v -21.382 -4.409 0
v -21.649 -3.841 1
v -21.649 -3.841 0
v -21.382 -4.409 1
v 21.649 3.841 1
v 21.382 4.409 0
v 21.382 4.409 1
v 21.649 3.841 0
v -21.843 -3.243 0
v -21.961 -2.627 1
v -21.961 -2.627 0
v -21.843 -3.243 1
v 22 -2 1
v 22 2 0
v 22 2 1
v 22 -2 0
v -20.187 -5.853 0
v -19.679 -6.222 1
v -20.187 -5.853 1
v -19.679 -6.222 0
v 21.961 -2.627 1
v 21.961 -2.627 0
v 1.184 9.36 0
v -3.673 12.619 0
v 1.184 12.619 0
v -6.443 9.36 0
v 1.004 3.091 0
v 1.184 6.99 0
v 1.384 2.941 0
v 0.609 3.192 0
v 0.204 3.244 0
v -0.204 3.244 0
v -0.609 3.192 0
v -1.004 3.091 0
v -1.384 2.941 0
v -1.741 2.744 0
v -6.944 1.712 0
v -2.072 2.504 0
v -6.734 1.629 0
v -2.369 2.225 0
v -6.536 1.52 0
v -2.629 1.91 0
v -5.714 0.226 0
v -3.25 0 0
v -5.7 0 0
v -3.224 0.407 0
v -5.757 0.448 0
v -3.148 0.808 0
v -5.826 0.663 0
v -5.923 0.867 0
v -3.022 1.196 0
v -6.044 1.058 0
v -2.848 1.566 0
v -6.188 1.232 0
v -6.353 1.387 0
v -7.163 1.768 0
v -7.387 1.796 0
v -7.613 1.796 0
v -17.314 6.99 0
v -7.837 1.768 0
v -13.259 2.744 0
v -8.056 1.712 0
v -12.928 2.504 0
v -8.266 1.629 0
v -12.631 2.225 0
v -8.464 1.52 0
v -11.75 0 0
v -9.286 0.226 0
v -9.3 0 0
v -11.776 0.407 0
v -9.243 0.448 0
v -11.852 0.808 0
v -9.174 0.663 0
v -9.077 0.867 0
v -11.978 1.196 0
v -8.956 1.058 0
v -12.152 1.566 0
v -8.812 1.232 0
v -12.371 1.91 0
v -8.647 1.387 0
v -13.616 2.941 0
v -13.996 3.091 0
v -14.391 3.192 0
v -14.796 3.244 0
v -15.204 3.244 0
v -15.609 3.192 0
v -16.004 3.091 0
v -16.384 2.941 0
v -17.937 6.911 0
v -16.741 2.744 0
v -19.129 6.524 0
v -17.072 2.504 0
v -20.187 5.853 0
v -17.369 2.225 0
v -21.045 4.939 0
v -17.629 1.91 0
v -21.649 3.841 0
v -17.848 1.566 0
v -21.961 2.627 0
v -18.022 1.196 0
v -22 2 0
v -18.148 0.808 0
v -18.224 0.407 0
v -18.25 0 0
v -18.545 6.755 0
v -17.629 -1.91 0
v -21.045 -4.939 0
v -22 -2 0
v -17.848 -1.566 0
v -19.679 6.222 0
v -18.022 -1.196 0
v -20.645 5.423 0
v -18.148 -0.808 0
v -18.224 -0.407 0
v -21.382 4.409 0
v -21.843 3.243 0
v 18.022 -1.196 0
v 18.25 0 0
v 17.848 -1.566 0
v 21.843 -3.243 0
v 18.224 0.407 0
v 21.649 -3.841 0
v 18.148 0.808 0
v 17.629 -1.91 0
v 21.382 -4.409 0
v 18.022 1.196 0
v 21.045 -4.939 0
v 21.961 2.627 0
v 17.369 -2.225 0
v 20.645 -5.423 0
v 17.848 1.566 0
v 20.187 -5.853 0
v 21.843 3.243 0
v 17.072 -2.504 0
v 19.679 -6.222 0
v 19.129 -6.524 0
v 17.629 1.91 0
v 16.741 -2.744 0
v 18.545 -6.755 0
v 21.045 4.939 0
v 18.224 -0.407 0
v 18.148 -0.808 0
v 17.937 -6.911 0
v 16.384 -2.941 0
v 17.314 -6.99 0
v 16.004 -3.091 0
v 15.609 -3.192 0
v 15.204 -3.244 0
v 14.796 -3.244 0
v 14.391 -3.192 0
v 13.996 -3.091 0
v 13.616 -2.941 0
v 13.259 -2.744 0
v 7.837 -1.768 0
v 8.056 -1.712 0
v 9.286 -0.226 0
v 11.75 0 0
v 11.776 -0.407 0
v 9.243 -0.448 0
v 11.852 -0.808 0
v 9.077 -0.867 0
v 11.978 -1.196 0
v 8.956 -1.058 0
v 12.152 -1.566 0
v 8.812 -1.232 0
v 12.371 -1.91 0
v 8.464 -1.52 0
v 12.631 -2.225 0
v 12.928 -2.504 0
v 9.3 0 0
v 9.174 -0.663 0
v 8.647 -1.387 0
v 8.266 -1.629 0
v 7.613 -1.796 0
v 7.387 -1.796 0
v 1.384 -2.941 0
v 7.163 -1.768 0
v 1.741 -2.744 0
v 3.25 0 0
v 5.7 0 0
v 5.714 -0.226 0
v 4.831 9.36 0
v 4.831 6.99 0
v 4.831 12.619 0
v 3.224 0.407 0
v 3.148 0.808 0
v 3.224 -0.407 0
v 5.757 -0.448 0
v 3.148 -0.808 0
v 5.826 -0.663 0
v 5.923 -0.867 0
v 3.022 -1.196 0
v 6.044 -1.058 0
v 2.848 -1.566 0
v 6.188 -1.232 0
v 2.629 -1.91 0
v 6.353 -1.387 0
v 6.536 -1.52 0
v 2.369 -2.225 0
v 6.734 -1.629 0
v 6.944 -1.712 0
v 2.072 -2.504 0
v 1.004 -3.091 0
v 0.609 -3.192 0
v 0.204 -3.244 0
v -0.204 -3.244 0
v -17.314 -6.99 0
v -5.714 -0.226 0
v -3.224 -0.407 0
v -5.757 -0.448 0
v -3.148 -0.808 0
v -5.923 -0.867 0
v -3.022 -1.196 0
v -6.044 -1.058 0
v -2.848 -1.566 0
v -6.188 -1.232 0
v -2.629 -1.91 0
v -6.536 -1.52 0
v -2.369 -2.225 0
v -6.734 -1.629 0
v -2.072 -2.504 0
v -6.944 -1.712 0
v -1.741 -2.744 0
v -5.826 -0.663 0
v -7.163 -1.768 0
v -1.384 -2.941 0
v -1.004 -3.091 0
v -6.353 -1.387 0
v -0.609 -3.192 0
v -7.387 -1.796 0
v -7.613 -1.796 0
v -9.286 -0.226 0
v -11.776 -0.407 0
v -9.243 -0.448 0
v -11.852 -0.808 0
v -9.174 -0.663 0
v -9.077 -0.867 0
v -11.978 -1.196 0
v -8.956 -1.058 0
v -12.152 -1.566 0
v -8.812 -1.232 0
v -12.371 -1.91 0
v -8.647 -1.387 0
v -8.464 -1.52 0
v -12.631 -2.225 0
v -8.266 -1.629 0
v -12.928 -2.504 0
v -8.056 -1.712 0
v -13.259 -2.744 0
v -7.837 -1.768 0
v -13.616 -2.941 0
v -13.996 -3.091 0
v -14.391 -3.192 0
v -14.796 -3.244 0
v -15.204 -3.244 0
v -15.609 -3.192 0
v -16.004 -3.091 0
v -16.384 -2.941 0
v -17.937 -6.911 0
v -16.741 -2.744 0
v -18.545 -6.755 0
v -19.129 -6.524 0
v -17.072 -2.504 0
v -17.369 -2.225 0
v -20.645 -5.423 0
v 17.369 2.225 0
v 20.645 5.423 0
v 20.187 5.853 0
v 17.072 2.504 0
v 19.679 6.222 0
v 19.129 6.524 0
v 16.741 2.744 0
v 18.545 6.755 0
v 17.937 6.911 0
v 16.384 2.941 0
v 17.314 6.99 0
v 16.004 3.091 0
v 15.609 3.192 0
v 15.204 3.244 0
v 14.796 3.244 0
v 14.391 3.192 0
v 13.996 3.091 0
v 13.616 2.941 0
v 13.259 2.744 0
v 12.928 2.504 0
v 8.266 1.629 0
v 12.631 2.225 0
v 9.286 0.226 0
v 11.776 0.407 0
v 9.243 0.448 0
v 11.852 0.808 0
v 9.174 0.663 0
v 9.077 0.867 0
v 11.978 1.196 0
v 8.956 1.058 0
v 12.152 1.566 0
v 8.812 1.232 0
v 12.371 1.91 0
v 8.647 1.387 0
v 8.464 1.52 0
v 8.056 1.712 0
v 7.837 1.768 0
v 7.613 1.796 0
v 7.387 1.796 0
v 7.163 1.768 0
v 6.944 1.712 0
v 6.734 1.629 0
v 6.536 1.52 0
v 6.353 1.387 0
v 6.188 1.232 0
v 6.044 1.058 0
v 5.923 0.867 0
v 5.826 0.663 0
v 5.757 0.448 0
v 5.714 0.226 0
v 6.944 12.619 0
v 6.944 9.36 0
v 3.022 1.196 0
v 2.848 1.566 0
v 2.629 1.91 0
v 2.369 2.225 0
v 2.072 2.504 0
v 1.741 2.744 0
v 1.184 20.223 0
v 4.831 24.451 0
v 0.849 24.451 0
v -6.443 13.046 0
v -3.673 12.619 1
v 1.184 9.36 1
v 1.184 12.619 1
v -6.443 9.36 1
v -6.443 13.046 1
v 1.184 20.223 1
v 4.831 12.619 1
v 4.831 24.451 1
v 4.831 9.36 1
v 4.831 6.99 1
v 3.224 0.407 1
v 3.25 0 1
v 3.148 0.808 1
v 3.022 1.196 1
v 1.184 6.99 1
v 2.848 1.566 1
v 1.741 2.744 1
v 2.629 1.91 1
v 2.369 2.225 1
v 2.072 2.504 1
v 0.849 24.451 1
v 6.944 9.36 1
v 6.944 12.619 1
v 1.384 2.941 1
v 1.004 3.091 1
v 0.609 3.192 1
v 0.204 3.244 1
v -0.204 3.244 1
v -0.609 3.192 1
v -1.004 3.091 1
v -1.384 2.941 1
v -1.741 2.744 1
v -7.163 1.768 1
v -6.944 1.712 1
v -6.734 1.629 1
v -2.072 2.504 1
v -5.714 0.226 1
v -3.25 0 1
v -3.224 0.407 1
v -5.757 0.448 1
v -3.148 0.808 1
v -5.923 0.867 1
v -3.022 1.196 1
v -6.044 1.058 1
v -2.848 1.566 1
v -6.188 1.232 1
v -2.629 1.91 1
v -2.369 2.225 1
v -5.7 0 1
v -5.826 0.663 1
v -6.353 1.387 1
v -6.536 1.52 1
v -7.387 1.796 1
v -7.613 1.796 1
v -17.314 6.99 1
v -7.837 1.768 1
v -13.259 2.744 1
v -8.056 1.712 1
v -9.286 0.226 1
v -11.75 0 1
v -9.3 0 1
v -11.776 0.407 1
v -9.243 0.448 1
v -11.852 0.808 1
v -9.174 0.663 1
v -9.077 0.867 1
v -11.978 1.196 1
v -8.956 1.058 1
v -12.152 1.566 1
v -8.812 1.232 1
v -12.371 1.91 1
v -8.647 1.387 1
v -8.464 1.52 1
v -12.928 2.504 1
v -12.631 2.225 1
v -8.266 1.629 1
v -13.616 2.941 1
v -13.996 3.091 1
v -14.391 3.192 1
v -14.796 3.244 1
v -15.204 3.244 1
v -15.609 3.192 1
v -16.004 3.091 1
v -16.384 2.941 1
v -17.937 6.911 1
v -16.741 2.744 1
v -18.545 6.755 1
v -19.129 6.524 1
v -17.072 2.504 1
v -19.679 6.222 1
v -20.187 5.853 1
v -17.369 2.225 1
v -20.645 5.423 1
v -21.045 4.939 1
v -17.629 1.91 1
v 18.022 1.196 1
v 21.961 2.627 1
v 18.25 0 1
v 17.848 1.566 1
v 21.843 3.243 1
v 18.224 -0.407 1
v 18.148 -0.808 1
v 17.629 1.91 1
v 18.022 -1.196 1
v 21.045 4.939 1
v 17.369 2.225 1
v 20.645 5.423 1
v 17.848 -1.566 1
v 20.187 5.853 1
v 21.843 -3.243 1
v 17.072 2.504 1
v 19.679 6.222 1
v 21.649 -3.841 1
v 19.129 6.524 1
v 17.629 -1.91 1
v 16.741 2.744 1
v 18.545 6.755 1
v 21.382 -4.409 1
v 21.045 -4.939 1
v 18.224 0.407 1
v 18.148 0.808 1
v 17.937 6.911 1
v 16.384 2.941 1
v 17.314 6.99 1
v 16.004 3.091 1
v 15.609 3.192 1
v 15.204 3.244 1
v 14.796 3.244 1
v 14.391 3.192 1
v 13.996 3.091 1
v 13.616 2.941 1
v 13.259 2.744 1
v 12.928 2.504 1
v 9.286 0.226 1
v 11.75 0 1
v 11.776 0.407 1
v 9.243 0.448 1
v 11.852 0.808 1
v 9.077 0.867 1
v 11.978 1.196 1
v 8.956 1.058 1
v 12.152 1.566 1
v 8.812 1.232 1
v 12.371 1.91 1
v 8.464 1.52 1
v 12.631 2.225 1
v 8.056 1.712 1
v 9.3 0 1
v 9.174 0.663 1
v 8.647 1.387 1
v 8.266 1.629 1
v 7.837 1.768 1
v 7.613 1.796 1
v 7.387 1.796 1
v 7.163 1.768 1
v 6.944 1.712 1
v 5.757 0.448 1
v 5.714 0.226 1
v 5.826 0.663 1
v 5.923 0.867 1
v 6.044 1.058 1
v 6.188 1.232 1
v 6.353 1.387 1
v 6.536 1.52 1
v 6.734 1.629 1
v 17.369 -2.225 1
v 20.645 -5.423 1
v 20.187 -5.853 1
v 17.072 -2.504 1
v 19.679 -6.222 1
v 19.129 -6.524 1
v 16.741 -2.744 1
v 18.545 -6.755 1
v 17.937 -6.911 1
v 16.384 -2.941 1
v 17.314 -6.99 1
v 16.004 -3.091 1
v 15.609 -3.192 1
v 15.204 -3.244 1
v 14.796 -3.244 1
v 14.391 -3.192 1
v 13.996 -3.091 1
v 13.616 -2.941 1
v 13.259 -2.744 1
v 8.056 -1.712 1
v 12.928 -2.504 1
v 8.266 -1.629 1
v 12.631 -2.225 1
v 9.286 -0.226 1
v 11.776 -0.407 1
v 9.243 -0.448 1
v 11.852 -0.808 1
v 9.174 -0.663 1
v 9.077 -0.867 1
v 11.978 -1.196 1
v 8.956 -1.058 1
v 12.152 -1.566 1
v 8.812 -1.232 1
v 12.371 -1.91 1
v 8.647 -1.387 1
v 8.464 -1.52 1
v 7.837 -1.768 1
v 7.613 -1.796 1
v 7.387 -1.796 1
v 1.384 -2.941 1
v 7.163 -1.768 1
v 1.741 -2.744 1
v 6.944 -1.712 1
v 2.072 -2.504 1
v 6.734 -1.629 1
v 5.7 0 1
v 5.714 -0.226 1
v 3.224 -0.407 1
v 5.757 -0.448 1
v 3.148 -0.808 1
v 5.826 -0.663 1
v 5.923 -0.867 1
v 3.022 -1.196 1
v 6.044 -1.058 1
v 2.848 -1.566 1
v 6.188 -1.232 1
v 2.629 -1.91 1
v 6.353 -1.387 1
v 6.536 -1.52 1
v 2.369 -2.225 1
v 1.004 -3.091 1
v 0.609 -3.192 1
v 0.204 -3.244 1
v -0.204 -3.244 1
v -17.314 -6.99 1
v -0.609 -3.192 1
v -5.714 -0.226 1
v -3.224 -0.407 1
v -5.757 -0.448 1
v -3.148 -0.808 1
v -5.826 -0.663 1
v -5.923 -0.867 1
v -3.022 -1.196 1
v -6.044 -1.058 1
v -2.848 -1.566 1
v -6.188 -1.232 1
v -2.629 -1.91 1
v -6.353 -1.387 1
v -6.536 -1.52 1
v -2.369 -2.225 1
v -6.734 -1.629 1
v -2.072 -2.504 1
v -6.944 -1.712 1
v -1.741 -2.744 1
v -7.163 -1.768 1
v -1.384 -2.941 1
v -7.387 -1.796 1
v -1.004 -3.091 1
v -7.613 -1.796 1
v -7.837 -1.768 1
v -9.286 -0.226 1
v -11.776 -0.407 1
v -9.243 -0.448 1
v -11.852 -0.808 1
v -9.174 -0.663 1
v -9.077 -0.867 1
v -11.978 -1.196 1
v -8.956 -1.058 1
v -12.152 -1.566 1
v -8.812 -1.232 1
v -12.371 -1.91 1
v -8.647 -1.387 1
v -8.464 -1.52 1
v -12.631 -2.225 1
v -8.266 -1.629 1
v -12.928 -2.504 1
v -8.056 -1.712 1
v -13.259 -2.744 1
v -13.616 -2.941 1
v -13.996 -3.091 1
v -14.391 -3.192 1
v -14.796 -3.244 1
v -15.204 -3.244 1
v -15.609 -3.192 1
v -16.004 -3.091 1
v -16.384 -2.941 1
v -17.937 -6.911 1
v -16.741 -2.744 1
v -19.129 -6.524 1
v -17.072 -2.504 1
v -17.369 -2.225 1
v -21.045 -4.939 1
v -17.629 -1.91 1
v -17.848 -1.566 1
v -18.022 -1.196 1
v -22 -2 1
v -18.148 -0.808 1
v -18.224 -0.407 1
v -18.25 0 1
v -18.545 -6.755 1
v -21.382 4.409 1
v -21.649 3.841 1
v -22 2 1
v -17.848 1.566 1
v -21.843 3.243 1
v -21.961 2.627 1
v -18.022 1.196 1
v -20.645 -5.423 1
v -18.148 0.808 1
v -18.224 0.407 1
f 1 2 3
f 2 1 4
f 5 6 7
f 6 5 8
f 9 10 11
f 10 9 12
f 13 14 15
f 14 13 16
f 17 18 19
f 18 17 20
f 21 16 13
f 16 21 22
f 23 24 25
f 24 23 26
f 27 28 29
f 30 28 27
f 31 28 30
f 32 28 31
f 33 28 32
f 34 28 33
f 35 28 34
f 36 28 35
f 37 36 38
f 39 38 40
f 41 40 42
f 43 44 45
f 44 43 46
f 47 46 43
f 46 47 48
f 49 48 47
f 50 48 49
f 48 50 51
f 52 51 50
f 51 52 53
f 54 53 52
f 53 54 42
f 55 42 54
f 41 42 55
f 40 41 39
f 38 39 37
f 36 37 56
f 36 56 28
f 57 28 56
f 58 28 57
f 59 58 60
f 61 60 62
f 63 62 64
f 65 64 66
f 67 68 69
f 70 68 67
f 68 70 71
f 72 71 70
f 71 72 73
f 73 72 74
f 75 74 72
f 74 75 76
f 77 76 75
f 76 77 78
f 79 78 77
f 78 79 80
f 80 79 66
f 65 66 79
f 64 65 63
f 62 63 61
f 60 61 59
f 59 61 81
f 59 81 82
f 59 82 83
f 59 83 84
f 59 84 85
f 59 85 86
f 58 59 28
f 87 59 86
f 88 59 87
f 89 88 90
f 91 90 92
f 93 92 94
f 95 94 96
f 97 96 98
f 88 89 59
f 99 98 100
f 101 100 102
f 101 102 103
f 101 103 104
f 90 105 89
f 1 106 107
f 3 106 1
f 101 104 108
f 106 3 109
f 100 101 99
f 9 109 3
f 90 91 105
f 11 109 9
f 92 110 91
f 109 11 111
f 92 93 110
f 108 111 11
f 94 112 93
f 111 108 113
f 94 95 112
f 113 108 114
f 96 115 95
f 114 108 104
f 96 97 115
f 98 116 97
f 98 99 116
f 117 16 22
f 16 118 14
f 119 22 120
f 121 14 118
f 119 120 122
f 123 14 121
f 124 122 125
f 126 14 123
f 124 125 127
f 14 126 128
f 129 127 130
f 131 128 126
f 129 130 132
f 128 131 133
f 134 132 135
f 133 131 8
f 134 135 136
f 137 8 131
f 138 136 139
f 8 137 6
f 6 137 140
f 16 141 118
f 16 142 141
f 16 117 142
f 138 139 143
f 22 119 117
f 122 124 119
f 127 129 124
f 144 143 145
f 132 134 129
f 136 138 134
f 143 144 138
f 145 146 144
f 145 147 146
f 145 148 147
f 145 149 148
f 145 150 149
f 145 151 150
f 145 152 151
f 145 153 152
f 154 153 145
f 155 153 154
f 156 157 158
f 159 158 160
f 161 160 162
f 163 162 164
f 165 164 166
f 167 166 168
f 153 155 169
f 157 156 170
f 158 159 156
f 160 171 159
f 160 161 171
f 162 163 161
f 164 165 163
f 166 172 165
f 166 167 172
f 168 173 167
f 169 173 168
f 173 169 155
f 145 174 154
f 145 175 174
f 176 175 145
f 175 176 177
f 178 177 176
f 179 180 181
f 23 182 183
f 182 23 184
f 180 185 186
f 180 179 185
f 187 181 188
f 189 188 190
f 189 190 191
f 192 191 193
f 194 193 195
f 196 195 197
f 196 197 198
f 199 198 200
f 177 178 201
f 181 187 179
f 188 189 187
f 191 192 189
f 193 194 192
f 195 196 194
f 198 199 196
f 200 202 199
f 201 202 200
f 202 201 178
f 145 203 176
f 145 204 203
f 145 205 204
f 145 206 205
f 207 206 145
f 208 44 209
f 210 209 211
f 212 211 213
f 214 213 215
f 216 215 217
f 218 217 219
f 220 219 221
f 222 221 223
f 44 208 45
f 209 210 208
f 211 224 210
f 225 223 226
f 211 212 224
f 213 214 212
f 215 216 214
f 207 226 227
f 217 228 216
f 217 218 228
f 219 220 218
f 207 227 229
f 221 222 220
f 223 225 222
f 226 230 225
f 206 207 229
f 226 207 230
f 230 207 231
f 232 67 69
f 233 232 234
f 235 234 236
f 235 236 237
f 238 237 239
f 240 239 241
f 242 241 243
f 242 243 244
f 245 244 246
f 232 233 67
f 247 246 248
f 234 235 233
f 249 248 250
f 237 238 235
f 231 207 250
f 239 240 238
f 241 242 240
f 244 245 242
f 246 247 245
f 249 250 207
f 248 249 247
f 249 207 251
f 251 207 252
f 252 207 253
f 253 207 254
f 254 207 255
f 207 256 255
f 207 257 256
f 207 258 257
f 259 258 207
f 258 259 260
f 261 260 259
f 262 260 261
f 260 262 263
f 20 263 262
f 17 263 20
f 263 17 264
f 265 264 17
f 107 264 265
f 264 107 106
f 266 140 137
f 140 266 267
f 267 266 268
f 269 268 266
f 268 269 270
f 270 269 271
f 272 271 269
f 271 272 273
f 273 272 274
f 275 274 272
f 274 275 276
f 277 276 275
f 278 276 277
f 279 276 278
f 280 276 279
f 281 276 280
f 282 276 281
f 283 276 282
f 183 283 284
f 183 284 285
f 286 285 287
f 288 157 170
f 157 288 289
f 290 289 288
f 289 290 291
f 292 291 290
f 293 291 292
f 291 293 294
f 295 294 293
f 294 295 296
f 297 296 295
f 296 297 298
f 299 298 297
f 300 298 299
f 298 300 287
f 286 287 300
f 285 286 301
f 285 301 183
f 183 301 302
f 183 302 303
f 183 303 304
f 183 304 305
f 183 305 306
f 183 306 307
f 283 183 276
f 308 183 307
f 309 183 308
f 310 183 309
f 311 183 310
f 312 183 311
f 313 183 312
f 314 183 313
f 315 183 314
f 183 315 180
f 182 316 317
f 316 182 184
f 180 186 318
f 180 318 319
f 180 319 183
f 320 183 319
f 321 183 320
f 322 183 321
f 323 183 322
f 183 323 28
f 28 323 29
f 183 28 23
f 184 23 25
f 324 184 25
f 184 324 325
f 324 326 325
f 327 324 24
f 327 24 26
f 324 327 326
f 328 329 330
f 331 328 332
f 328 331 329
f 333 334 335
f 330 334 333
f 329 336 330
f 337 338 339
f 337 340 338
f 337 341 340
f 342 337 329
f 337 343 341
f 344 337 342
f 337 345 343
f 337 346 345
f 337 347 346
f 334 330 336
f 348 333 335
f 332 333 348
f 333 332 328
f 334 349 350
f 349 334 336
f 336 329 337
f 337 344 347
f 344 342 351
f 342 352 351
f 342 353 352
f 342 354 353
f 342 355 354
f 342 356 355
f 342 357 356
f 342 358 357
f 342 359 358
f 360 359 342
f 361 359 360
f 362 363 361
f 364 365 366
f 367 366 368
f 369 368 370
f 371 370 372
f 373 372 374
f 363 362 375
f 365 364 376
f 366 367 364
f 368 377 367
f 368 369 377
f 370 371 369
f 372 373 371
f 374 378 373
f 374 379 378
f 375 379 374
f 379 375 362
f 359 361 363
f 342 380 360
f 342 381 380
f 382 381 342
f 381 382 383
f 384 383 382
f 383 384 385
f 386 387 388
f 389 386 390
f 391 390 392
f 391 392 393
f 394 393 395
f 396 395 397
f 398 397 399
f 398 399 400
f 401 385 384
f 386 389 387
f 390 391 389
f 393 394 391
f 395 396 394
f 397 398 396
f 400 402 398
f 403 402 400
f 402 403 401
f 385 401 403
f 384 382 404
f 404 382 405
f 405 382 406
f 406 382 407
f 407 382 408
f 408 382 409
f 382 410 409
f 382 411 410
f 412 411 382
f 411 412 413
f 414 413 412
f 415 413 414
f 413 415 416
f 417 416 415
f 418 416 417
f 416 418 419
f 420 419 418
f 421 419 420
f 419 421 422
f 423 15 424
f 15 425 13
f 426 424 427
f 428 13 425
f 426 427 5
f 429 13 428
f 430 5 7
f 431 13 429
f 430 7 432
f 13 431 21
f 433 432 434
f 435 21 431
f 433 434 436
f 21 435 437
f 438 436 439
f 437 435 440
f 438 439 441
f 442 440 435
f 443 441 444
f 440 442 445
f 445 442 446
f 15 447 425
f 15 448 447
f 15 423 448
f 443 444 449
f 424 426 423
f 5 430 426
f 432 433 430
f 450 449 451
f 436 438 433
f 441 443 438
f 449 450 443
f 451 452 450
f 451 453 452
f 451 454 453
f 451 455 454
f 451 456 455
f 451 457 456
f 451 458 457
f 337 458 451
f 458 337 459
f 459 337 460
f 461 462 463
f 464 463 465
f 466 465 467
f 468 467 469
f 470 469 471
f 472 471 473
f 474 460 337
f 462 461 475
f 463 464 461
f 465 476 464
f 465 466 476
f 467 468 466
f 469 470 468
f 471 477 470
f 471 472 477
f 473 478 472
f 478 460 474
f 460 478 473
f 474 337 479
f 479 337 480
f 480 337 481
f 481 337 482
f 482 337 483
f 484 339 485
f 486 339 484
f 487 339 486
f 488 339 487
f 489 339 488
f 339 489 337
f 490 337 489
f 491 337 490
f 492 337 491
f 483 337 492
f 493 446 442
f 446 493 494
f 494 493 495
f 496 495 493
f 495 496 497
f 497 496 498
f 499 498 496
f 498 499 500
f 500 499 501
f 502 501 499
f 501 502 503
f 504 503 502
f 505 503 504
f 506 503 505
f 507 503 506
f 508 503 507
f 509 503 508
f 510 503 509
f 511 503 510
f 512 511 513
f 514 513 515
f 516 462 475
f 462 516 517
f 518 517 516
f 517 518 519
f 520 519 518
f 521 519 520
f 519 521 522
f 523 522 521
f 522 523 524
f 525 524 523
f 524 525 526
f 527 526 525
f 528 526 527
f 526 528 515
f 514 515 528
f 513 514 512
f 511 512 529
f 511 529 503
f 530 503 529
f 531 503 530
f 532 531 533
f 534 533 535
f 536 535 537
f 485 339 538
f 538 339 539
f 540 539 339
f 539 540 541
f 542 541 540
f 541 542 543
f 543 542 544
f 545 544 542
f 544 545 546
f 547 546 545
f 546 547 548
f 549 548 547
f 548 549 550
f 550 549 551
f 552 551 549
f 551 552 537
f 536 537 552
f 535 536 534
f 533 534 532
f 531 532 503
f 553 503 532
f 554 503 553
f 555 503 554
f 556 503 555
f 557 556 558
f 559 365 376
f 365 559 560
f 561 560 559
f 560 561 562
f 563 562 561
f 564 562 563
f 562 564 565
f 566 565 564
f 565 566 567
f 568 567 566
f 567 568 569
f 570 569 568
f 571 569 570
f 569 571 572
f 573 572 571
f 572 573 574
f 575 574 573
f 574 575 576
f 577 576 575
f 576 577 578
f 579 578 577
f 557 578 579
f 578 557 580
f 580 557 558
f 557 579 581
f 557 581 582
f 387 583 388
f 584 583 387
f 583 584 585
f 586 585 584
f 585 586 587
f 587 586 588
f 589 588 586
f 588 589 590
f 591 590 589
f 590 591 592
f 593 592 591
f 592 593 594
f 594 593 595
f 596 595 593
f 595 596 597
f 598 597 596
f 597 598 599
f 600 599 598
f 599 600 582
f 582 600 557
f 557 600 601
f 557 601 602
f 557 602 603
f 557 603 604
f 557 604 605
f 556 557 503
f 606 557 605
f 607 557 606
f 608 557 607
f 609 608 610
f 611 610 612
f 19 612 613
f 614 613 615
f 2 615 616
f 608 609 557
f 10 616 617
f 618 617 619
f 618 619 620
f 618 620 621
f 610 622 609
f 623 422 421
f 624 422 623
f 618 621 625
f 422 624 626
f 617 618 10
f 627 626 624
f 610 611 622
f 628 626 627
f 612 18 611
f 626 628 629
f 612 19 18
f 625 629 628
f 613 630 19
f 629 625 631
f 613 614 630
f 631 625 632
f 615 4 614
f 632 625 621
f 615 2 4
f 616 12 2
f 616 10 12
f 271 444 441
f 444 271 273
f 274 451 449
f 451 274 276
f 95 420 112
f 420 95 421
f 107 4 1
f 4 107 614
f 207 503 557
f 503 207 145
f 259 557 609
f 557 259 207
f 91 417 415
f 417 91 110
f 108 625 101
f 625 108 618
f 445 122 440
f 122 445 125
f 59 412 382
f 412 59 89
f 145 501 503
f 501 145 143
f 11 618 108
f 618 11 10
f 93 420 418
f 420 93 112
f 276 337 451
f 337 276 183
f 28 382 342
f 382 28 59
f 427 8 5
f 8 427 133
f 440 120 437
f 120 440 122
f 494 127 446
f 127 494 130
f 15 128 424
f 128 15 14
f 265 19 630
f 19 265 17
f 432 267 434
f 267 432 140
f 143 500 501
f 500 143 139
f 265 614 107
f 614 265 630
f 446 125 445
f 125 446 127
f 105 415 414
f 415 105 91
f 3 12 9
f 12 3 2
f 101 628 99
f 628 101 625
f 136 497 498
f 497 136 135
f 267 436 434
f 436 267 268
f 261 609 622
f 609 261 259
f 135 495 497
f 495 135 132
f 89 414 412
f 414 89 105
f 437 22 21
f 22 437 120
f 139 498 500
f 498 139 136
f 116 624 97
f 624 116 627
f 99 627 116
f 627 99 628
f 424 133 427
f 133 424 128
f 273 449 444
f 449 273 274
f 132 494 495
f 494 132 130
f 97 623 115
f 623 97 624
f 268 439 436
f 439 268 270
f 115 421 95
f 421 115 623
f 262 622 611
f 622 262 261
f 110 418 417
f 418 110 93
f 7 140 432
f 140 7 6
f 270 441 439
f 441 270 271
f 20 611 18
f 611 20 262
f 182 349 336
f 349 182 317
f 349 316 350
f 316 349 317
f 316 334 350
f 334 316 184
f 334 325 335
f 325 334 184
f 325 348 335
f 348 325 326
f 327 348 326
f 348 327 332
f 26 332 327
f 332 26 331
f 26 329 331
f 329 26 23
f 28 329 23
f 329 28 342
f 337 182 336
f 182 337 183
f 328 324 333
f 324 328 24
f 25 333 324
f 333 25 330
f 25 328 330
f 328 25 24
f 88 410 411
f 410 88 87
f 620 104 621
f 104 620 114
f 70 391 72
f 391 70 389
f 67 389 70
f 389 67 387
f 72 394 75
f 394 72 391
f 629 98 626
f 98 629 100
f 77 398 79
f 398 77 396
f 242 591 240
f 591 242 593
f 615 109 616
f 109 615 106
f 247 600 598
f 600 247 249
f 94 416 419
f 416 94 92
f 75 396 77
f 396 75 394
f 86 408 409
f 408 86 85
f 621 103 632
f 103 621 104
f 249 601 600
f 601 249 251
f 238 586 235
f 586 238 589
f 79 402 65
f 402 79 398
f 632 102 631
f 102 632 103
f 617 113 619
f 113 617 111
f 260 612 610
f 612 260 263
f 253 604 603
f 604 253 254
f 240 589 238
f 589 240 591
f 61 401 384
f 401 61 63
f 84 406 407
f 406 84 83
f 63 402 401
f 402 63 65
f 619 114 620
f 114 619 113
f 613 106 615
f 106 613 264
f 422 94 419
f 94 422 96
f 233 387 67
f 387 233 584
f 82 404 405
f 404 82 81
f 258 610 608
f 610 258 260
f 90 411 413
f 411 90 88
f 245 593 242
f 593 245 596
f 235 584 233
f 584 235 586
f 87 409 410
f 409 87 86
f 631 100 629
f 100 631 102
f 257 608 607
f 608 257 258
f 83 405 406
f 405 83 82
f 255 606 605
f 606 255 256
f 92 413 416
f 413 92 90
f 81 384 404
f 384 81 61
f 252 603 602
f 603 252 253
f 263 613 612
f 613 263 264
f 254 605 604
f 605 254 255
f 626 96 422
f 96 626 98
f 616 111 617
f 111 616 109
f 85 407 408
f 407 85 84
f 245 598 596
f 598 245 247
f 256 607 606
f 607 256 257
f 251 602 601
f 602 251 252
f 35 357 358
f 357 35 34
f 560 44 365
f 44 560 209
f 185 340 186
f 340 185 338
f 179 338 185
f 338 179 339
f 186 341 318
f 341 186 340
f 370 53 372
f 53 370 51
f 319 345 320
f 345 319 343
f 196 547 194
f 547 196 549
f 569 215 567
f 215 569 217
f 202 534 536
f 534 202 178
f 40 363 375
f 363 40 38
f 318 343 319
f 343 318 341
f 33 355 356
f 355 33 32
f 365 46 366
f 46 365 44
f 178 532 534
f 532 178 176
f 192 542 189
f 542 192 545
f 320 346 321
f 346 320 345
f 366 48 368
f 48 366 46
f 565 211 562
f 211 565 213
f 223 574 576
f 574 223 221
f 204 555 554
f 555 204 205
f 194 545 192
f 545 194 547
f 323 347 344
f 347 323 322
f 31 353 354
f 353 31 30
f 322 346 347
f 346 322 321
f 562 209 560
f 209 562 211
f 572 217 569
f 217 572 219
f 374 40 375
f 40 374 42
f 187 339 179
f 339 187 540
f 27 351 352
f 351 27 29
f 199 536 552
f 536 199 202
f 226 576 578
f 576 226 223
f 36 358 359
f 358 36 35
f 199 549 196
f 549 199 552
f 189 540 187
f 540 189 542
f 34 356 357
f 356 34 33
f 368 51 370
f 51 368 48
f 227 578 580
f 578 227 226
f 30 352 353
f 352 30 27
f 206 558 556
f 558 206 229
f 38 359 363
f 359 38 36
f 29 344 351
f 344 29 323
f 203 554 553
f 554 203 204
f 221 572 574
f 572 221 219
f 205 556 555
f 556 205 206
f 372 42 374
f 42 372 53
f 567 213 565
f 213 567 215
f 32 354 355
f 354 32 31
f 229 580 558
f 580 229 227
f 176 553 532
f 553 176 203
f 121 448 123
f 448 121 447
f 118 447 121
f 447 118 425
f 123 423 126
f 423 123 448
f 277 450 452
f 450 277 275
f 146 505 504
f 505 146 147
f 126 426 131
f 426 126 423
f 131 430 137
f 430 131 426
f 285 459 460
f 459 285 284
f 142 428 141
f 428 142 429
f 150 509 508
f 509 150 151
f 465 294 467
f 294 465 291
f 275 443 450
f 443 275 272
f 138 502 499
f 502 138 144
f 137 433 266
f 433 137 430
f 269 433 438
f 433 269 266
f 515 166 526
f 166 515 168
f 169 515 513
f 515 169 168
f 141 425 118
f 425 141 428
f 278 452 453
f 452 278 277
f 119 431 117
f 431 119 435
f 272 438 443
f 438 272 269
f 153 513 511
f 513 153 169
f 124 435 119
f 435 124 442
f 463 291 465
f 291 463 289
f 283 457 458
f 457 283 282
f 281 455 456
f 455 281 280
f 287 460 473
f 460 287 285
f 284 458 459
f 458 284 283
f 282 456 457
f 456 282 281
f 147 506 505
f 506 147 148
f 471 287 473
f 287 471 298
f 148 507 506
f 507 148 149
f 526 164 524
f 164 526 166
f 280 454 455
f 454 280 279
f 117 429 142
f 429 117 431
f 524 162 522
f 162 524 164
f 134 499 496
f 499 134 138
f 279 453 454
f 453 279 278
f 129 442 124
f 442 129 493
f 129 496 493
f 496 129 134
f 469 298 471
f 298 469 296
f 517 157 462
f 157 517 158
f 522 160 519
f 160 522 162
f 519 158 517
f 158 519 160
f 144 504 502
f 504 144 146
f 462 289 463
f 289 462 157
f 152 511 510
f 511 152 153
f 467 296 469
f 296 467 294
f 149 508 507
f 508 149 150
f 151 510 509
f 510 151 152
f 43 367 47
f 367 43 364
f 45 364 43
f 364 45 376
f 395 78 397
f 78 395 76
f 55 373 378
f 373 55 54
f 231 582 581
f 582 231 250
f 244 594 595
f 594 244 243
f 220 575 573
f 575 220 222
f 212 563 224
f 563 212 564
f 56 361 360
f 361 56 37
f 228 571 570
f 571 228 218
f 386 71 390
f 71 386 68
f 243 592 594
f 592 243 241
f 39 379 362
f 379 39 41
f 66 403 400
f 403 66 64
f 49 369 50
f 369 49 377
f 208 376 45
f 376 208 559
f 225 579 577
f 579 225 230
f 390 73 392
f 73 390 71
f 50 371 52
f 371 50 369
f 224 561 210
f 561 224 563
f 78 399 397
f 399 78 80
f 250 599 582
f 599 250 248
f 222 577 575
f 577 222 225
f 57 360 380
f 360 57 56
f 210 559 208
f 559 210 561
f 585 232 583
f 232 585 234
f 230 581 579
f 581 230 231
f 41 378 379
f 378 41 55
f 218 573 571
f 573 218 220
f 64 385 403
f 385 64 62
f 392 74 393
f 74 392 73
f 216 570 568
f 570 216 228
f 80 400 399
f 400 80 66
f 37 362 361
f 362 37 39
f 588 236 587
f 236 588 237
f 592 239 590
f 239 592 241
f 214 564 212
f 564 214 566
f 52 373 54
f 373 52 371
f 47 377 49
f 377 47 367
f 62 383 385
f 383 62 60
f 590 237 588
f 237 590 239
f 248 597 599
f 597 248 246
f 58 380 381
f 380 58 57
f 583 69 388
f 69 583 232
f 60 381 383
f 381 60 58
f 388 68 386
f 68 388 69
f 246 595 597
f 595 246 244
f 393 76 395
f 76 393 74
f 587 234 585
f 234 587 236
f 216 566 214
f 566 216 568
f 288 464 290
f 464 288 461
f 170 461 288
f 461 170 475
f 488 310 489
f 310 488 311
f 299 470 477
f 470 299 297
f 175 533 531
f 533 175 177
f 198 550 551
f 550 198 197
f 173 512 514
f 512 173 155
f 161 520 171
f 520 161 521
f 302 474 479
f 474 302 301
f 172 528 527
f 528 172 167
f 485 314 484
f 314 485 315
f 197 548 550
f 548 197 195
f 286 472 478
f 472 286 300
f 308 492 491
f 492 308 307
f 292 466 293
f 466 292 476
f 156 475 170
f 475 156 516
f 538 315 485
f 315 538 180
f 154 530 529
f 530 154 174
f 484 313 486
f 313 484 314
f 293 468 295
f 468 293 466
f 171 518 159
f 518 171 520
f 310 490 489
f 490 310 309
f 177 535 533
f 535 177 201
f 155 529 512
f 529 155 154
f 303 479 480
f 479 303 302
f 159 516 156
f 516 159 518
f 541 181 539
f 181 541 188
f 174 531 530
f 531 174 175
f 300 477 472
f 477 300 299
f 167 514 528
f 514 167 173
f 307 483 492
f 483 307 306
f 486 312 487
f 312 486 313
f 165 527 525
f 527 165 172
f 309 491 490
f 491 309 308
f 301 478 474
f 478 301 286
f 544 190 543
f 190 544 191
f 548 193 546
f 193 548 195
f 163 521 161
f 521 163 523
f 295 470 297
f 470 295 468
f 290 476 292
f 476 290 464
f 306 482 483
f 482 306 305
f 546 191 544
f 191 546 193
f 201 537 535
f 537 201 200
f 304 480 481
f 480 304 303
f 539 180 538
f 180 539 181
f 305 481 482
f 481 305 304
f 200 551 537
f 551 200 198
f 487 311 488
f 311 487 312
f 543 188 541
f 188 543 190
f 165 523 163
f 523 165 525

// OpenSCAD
$fn = 50;


difference() {
	union() {
		hull() {
			translate(v = [-17.0000000000, 2.0000000000, 0]) {
				cylinder(h = 1, r = 5);
			}
			translate(v = [17.0000000000, 2.0000000000, 0]) {
				cylinder(h = 1, r = 5);
			}
			translate(v = [-17.0000000000, -2.0000000000, 0]) {
				cylinder(h = 1, r = 5);
			}
			translate(v = [17.0000000000, -2.0000000000, 0]) {
				cylinder(h = 1, r = 5);
			}
		}
		translate(v = [0, 24, 0]) {
			linear_extrude(height = 1) {
				text(font = "DejaVu Sans Mono:style=Bold", halign = "center", size = 19.0000000000, text = "4", valign = "top");
			}
		}
	}
	union() {
		translate(v = [-15.0000000000, 0.0000000000, 0]) {
			translate(v = [0, 0, -100]) {
				cylinder(h = 200, r = 3.2500000000);
			}
		}
		translate(v = [0, 0, -100]) {
			cylinder(h = 200, r = 3.2500000000);
		}
		translate(v = [15.0000000000, 0.0000000000, 0]) {
			translate(v = [0, 0, -100]) {
				cylinder(h = 200, r = 3.2500000000);
			}
		}
		translate(v = [-15.0000000000, 0.0000000000, 0]) {
			translate(v = [0, 0, -100]) {
				cylinder(h = 200, r = 1.8000000000);
			}
		}
		translate(v = [-7.5000000000, 0.0000000000, 0]) {
			translate(v = [0, 0, -100]) {
				cylinder(h = 200, r = 1.8000000000);
			}
		}
		translate(v = [0, 0, -100]) {
			cylinder(h = 200, r = 1.8000000000);
		}
		translate(v = [7.5000000000, 0.0000000000, 0]) {
			translate(v = [0, 0, -100]) {
				cylinder(h = 200, r = 1.8000000000);
			}
		}
		translate(v = [15.0000000000, 0.0000000000, 0]) {
			translate(v = [0, 0, -100]) {
				cylinder(h = 200, r = 1.8000000000);
			}
		}
	}
}
